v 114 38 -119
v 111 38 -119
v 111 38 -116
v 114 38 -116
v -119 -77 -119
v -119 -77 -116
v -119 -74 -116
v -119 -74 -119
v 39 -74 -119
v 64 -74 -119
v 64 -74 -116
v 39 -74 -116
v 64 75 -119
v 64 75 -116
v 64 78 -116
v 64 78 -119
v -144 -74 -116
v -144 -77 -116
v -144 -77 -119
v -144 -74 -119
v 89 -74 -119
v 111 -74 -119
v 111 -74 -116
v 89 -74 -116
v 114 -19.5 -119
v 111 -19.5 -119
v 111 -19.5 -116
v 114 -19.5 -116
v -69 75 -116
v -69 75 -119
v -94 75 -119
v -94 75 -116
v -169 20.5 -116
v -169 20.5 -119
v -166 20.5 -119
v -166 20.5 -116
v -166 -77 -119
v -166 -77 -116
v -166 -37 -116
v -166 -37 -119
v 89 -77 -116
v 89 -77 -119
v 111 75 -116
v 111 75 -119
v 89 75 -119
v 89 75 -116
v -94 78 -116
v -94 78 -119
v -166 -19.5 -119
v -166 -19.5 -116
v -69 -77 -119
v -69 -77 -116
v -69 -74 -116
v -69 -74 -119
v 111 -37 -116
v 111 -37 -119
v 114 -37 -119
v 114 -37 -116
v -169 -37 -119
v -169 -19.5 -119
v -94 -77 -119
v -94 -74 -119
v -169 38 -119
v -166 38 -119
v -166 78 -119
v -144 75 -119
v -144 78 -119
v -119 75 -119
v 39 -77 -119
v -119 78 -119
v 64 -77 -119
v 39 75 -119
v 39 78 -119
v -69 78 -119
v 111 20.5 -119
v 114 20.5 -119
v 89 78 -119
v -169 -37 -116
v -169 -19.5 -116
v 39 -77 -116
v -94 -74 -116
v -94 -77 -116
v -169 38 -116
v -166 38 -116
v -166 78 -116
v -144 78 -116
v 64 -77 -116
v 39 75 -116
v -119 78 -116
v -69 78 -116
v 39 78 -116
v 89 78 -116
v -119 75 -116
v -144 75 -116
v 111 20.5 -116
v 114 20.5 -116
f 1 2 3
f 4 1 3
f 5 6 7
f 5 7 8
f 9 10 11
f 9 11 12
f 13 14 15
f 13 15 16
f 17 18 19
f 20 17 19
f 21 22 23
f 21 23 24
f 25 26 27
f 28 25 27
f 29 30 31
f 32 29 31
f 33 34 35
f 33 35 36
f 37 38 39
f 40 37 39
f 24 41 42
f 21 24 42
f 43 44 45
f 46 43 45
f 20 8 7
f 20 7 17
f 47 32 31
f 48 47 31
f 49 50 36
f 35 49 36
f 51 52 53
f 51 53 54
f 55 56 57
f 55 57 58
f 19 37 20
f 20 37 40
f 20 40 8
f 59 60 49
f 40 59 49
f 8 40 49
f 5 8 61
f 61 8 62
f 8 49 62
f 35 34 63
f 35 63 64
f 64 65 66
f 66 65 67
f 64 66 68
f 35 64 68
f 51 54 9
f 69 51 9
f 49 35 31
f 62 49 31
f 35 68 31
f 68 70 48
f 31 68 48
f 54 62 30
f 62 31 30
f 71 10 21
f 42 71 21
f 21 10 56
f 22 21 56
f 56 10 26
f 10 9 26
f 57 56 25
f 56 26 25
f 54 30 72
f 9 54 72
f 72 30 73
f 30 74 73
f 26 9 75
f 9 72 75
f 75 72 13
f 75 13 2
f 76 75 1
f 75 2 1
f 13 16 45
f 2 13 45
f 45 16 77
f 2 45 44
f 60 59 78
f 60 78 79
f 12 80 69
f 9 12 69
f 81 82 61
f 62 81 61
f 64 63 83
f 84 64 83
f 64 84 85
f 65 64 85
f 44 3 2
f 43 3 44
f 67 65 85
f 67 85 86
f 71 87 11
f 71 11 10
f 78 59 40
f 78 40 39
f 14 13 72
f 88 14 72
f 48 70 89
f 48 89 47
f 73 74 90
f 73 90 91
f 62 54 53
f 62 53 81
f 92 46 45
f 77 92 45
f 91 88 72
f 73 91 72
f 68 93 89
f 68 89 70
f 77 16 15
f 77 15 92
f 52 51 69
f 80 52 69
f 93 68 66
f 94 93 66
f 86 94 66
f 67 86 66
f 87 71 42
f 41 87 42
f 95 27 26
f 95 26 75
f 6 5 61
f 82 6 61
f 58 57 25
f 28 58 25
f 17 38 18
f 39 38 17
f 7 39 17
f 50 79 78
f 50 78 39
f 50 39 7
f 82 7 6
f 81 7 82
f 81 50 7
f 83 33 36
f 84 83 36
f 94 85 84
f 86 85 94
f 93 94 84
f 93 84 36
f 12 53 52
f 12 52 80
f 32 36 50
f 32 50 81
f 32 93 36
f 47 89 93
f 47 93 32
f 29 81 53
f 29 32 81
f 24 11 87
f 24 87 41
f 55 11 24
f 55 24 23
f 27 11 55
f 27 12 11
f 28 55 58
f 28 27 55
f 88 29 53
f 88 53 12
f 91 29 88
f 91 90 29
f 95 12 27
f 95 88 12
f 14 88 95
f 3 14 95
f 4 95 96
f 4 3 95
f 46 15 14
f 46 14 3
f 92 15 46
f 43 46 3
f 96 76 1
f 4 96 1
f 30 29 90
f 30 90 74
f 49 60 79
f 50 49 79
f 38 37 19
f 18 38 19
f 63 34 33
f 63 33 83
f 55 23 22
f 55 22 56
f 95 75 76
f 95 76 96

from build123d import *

# Parameters (mm, degrees)
RECTANGLE134_W                               = 40
RECTANGLE134_H                               = 3
EXTRUDE175_DEPTH                             = 3
RECTANGLE135_W                               = 40
RECTANGLE135_H                               = 3
EXTRUDE176_DEPTH                             = 3
RECTANGLE133_W                               = 40
RECTANGLE133_H                               = 3
EXTRUDE174_DEPTH                             = 3
RECTANGLE128_AS_DRAWN_W                      = 25
RECTANGLE128_AS_DRAWN_H                      = 3
EXTRUDE161_DEPTH                             = 3
EXTRUDE161_ONTO_RECTANGLE128_ROLL_ANGLE      = -90
EXTRUDE161_ONTO_RECTANGLE128_PLACEMENT_ANGLE = 180
RECTANGLE129_AS_DRAWN_W                      = 25
RECTANGLE129_AS_DRAWN_H                      = 3
EXTRUDE159_DEPTH                             = 3
EXTRUDE159_ONTO_RECTANGLE129_ROLL_ANGLE      = -90
EXTRUDE159_ONTO_RECTANGLE129_PLACEMENT_ANGLE = 180
RECTANGLE127_AS_DRAWN_W                      = 25
RECTANGLE127_AS_DRAWN_H                      = 3
EXTRUDE151_DEPTH                             = 3
EXTRUDE151_ONTO_RECTANGLE127_ROLL_ANGLE      = -90
EXTRUDE151_ONTO_RECTANGLE127_PLACEMENT_ANGLE = 180
EXTRUDE154_DEPTH                             = 3
EXTRUDE154_ONTO_RECTANGLE129_ROLL_ANGLE      = -90
EXTRUDE154_ONTO_RECTANGLE129_PLACEMENT_ANGLE = 180
BOX036_W                                     = 283
BOX036_H                                     = 155
BOX036_DEPTH                                 = 3


with BuildPart() as extrude175:
    # Rectangle134 → Extrude175 (new body)
    with BuildSketch(Plane(origin=(114, 38, -112), x_dir=(0, 1, 0), z_dir=(1, 0, 0))):
        with Locations((20, -1.5)):
            Rectangle(RECTANGLE134_W, RECTANGLE134_H)
    extrude(amount=EXTRUDE175_DEPTH)


with BuildPart() as extrude176:
    # Rectangle135 → Extrude176 (new body)
    with BuildSketch(Plane(origin=(114, -19.5, -112), x_dir=(0, 1, 0), z_dir=(1, 0, 0))):
        with Locations((20, -1.5)):
            Rectangle(RECTANGLE135_W, RECTANGLE135_H)
    extrude(amount=EXTRUDE176_DEPTH)


with BuildPart() as extrude174:
    # Rectangle133 → Extrude174 (new body)
    with BuildSketch(Plane(origin=(114, -77, -112), x_dir=(0, 1, 0), z_dir=(1, 0, 0))):
        with Locations((20, -1.5)):
            Rectangle(RECTANGLE133_W, RECTANGLE133_H)
    extrude(amount=EXTRUDE174_DEPTH)


with BuildPart() as fusion064047:
    # Fusion064047 base: copy of Extrude174
    add(extrude174.part)

    # Fusion064047: union Extrude175, Extrude176
    add(extrude175.part)
    add(extrude176.part)


with BuildPart() as fusion064047_1:
    # Fusion064047 placement: moved
    add(fusion064047.part.moved(Location((-283, 0, 0))))


with BuildPart() as fusion064041:
    # Fusion064041 base: copy of Extrude174
    add(extrude174.part)

    # Fusion064041: union Extrude175, Extrude176
    add(extrude175.part)
    add(extrude176.part)


with BuildPart() as fusion064041_1:
    # Fusion064041 placement: moved
    add(fusion064041.part.moved(Location((-3, 0, 0))))


with BuildPart() as extrude161:
    # Rectangle128 as drawn → Extrude161 (new)
    with BuildSketch(Plane.XY):
        with Locations((12.5, 1.5)):
            Rectangle(RECTANGLE128_AS_DRAWN_W, RECTANGLE128_AS_DRAWN_H)
    extrude(amount=-EXTRUDE161_DEPTH)


with BuildPart() as extrude161_1:
    # Extrude161 onto Rectangle128 roll: moved
    add(extrude161.part.rotate(Axis((0, 0, 0), (1, 0, 0)), EXTRUDE161_ONTO_RECTANGLE128_ROLL_ANGLE))


with BuildPart() as extrude161_2:
    # Extrude161 onto Rectangle128 placement: moved
    add(extrude161_1.part.moved(Location((89, -77, -70))).rotate(Axis((89, -77, -70), (0, 0, 1)), EXTRUDE161_ONTO_RECTANGLE128_PLACEMENT_ANGLE))


with BuildPart() as extrude161_3:
    # Extrude161 placement: moved
    add(extrude161_2.part.moved(Location((-208, 0, -42))))


with BuildPart() as extrude159:
    # Rectangle129 as drawn → Extrude159 (new)
    with BuildSketch(Plane.XY):
        with Locations((12.5, 1.5)):
            Rectangle(RECTANGLE129_AS_DRAWN_W, RECTANGLE129_AS_DRAWN_H)
    extrude(amount=-EXTRUDE159_DEPTH)


with BuildPart() as extrude159_1:
    # Extrude159 onto Rectangle129 roll: moved
    add(extrude159.part.rotate(Axis((0, 0, 0), (1, 0, 0)), EXTRUDE159_ONTO_RECTANGLE129_ROLL_ANGLE))


with BuildPart() as extrude159_2:
    # Extrude159 onto Rectangle129 placement: moved
    add(extrude159_1.part.moved(Location((64, -77, -70))).rotate(Axis((64, -77, -70), (0, 0, 1)), EXTRUDE159_ONTO_RECTANGLE129_PLACEMENT_ANGLE))


with BuildPart() as extrude159_3:
    # Extrude159 placement: moved
    add(extrude159_2.part.moved(Location((-133, 0, -42))))


with BuildPart() as fusion064034:
    # Fusion064034 base: copy of Extrude159
    add(extrude159_3.part)

    # Fusion064034: union Extrude161
    add(extrude161_3.part)


with BuildPart() as fusion064034_1:
    # Fusion064034 placement: moved
    add(fusion064034.part.moved(Location((0, 152, 0))))


with BuildPart() as extrude151:
    # Rectangle127 as drawn → Extrude151 (new)
    with BuildSketch(Plane.XY):
        with Locations((12.5, 1.5)):
            Rectangle(RECTANGLE127_AS_DRAWN_W, RECTANGLE127_AS_DRAWN_H)
    extrude(amount=-EXTRUDE151_DEPTH)


with BuildPart() as extrude151_1:
    # Extrude151 onto Rectangle127 roll: moved
    add(extrude151.part.rotate(Axis((0, 0, 0), (1, 0, 0)), EXTRUDE151_ONTO_RECTANGLE127_ROLL_ANGLE))


with BuildPart() as extrude151_2:
    # Extrude151 onto Rectangle127 placement: moved
    add(extrude151_1.part.moved(Location((114, -77, -70))).rotate(Axis((114, -77, -70), (0, 0, 1)), EXTRUDE151_ONTO_RECTANGLE127_PLACEMENT_ANGLE))


with BuildPart() as extrude151_3:
    # Extrude151 placement: moved
    add(extrude151_2.part.moved(Location((0, 0, -42))))


with BuildPart() as extrude154:
    # Rectangle129 as drawn → Extrude154 (new)
    with BuildSketch(Plane.XY):
        with Locations((12.5, 1.5)):
            Rectangle(RECTANGLE129_AS_DRAWN_W, RECTANGLE129_AS_DRAWN_H)
    extrude(amount=-EXTRUDE154_DEPTH)


with BuildPart() as extrude154_1:
    # Extrude154 onto Rectangle129 roll: moved
    add(extrude154.part.rotate(Axis((0, 0, 0), (1, 0, 0)), EXTRUDE154_ONTO_RECTANGLE129_ROLL_ANGLE))


with BuildPart() as extrude154_2:
    # Extrude154 onto Rectangle129 placement: moved
    add(extrude154_1.part.moved(Location((64, -77, -70))).rotate(Axis((64, -77, -70), (0, 0, 1)), EXTRUDE154_ONTO_RECTANGLE129_PLACEMENT_ANGLE))


with BuildPart() as extrude154_3:
    # Extrude154 placement: moved
    add(extrude154_2.part.moved(Location((0, 0, -42))))


with BuildPart() as fusion064040:
    # Fusion064033 base: copy of Extrude154
    add(extrude154_3.part)

    # Fusion064033: union Extrude151
    add(extrude151_3.part)


with BuildPart() as fusion064040_1:
    # Fusion064033 placement: moved
    add(fusion064040.part.moved(Location((0, 152, 0))))

    # Fusion064040: union Fusion064034
    add(fusion064034_1.part)


with BuildPart() as fusion064032:
    # Fusion064032 base: copy of Extrude159
    add(extrude159_3.part)

    # Fusion064032: union Extrude161
    add(extrude161_3.part)


with BuildPart() as fusion064029:
    # Fusion064029 base: copy of Extrude154
    add(extrude154_3.part)

    # Fusion064029: union Extrude151
    add(extrude151_3.part)


with BuildPart() as base_lower003:
    # Box036 → Box036 (new body)
    with BuildSketch(Plane(origin=(-169, -77, -115), x_dir=(1, 0, 0), z_dir=(0, 0, 1))):
        with Locations((141.5, 77.5)):
            Rectangle(BOX036_W, BOX036_H)
    extrude(amount=BOX036_DEPTH)

    # Cut035018: cut Fusion064029
    add(fusion064029.part, mode=Mode.SUBTRACT)

    # Cut035022: cut Fusion064032
    add(fusion064032.part, mode=Mode.SUBTRACT)

    # Cut035027: cut Fusion064040
    add(fusion064040_1.part, mode=Mode.SUBTRACT)

    # Cut035029: cut Fusion064041
    add(fusion064041_1.part, mode=Mode.SUBTRACT)

    # Cut035033: cut Fusion064047
    add(fusion064047_1.part, mode=Mode.SUBTRACT)


with BuildPart() as base_lower003_1:
    # Cut035033 placement: moved
    add(base_lower003.part.moved(Location((0, 0, -4))))


solid = base_lower003_1.part
